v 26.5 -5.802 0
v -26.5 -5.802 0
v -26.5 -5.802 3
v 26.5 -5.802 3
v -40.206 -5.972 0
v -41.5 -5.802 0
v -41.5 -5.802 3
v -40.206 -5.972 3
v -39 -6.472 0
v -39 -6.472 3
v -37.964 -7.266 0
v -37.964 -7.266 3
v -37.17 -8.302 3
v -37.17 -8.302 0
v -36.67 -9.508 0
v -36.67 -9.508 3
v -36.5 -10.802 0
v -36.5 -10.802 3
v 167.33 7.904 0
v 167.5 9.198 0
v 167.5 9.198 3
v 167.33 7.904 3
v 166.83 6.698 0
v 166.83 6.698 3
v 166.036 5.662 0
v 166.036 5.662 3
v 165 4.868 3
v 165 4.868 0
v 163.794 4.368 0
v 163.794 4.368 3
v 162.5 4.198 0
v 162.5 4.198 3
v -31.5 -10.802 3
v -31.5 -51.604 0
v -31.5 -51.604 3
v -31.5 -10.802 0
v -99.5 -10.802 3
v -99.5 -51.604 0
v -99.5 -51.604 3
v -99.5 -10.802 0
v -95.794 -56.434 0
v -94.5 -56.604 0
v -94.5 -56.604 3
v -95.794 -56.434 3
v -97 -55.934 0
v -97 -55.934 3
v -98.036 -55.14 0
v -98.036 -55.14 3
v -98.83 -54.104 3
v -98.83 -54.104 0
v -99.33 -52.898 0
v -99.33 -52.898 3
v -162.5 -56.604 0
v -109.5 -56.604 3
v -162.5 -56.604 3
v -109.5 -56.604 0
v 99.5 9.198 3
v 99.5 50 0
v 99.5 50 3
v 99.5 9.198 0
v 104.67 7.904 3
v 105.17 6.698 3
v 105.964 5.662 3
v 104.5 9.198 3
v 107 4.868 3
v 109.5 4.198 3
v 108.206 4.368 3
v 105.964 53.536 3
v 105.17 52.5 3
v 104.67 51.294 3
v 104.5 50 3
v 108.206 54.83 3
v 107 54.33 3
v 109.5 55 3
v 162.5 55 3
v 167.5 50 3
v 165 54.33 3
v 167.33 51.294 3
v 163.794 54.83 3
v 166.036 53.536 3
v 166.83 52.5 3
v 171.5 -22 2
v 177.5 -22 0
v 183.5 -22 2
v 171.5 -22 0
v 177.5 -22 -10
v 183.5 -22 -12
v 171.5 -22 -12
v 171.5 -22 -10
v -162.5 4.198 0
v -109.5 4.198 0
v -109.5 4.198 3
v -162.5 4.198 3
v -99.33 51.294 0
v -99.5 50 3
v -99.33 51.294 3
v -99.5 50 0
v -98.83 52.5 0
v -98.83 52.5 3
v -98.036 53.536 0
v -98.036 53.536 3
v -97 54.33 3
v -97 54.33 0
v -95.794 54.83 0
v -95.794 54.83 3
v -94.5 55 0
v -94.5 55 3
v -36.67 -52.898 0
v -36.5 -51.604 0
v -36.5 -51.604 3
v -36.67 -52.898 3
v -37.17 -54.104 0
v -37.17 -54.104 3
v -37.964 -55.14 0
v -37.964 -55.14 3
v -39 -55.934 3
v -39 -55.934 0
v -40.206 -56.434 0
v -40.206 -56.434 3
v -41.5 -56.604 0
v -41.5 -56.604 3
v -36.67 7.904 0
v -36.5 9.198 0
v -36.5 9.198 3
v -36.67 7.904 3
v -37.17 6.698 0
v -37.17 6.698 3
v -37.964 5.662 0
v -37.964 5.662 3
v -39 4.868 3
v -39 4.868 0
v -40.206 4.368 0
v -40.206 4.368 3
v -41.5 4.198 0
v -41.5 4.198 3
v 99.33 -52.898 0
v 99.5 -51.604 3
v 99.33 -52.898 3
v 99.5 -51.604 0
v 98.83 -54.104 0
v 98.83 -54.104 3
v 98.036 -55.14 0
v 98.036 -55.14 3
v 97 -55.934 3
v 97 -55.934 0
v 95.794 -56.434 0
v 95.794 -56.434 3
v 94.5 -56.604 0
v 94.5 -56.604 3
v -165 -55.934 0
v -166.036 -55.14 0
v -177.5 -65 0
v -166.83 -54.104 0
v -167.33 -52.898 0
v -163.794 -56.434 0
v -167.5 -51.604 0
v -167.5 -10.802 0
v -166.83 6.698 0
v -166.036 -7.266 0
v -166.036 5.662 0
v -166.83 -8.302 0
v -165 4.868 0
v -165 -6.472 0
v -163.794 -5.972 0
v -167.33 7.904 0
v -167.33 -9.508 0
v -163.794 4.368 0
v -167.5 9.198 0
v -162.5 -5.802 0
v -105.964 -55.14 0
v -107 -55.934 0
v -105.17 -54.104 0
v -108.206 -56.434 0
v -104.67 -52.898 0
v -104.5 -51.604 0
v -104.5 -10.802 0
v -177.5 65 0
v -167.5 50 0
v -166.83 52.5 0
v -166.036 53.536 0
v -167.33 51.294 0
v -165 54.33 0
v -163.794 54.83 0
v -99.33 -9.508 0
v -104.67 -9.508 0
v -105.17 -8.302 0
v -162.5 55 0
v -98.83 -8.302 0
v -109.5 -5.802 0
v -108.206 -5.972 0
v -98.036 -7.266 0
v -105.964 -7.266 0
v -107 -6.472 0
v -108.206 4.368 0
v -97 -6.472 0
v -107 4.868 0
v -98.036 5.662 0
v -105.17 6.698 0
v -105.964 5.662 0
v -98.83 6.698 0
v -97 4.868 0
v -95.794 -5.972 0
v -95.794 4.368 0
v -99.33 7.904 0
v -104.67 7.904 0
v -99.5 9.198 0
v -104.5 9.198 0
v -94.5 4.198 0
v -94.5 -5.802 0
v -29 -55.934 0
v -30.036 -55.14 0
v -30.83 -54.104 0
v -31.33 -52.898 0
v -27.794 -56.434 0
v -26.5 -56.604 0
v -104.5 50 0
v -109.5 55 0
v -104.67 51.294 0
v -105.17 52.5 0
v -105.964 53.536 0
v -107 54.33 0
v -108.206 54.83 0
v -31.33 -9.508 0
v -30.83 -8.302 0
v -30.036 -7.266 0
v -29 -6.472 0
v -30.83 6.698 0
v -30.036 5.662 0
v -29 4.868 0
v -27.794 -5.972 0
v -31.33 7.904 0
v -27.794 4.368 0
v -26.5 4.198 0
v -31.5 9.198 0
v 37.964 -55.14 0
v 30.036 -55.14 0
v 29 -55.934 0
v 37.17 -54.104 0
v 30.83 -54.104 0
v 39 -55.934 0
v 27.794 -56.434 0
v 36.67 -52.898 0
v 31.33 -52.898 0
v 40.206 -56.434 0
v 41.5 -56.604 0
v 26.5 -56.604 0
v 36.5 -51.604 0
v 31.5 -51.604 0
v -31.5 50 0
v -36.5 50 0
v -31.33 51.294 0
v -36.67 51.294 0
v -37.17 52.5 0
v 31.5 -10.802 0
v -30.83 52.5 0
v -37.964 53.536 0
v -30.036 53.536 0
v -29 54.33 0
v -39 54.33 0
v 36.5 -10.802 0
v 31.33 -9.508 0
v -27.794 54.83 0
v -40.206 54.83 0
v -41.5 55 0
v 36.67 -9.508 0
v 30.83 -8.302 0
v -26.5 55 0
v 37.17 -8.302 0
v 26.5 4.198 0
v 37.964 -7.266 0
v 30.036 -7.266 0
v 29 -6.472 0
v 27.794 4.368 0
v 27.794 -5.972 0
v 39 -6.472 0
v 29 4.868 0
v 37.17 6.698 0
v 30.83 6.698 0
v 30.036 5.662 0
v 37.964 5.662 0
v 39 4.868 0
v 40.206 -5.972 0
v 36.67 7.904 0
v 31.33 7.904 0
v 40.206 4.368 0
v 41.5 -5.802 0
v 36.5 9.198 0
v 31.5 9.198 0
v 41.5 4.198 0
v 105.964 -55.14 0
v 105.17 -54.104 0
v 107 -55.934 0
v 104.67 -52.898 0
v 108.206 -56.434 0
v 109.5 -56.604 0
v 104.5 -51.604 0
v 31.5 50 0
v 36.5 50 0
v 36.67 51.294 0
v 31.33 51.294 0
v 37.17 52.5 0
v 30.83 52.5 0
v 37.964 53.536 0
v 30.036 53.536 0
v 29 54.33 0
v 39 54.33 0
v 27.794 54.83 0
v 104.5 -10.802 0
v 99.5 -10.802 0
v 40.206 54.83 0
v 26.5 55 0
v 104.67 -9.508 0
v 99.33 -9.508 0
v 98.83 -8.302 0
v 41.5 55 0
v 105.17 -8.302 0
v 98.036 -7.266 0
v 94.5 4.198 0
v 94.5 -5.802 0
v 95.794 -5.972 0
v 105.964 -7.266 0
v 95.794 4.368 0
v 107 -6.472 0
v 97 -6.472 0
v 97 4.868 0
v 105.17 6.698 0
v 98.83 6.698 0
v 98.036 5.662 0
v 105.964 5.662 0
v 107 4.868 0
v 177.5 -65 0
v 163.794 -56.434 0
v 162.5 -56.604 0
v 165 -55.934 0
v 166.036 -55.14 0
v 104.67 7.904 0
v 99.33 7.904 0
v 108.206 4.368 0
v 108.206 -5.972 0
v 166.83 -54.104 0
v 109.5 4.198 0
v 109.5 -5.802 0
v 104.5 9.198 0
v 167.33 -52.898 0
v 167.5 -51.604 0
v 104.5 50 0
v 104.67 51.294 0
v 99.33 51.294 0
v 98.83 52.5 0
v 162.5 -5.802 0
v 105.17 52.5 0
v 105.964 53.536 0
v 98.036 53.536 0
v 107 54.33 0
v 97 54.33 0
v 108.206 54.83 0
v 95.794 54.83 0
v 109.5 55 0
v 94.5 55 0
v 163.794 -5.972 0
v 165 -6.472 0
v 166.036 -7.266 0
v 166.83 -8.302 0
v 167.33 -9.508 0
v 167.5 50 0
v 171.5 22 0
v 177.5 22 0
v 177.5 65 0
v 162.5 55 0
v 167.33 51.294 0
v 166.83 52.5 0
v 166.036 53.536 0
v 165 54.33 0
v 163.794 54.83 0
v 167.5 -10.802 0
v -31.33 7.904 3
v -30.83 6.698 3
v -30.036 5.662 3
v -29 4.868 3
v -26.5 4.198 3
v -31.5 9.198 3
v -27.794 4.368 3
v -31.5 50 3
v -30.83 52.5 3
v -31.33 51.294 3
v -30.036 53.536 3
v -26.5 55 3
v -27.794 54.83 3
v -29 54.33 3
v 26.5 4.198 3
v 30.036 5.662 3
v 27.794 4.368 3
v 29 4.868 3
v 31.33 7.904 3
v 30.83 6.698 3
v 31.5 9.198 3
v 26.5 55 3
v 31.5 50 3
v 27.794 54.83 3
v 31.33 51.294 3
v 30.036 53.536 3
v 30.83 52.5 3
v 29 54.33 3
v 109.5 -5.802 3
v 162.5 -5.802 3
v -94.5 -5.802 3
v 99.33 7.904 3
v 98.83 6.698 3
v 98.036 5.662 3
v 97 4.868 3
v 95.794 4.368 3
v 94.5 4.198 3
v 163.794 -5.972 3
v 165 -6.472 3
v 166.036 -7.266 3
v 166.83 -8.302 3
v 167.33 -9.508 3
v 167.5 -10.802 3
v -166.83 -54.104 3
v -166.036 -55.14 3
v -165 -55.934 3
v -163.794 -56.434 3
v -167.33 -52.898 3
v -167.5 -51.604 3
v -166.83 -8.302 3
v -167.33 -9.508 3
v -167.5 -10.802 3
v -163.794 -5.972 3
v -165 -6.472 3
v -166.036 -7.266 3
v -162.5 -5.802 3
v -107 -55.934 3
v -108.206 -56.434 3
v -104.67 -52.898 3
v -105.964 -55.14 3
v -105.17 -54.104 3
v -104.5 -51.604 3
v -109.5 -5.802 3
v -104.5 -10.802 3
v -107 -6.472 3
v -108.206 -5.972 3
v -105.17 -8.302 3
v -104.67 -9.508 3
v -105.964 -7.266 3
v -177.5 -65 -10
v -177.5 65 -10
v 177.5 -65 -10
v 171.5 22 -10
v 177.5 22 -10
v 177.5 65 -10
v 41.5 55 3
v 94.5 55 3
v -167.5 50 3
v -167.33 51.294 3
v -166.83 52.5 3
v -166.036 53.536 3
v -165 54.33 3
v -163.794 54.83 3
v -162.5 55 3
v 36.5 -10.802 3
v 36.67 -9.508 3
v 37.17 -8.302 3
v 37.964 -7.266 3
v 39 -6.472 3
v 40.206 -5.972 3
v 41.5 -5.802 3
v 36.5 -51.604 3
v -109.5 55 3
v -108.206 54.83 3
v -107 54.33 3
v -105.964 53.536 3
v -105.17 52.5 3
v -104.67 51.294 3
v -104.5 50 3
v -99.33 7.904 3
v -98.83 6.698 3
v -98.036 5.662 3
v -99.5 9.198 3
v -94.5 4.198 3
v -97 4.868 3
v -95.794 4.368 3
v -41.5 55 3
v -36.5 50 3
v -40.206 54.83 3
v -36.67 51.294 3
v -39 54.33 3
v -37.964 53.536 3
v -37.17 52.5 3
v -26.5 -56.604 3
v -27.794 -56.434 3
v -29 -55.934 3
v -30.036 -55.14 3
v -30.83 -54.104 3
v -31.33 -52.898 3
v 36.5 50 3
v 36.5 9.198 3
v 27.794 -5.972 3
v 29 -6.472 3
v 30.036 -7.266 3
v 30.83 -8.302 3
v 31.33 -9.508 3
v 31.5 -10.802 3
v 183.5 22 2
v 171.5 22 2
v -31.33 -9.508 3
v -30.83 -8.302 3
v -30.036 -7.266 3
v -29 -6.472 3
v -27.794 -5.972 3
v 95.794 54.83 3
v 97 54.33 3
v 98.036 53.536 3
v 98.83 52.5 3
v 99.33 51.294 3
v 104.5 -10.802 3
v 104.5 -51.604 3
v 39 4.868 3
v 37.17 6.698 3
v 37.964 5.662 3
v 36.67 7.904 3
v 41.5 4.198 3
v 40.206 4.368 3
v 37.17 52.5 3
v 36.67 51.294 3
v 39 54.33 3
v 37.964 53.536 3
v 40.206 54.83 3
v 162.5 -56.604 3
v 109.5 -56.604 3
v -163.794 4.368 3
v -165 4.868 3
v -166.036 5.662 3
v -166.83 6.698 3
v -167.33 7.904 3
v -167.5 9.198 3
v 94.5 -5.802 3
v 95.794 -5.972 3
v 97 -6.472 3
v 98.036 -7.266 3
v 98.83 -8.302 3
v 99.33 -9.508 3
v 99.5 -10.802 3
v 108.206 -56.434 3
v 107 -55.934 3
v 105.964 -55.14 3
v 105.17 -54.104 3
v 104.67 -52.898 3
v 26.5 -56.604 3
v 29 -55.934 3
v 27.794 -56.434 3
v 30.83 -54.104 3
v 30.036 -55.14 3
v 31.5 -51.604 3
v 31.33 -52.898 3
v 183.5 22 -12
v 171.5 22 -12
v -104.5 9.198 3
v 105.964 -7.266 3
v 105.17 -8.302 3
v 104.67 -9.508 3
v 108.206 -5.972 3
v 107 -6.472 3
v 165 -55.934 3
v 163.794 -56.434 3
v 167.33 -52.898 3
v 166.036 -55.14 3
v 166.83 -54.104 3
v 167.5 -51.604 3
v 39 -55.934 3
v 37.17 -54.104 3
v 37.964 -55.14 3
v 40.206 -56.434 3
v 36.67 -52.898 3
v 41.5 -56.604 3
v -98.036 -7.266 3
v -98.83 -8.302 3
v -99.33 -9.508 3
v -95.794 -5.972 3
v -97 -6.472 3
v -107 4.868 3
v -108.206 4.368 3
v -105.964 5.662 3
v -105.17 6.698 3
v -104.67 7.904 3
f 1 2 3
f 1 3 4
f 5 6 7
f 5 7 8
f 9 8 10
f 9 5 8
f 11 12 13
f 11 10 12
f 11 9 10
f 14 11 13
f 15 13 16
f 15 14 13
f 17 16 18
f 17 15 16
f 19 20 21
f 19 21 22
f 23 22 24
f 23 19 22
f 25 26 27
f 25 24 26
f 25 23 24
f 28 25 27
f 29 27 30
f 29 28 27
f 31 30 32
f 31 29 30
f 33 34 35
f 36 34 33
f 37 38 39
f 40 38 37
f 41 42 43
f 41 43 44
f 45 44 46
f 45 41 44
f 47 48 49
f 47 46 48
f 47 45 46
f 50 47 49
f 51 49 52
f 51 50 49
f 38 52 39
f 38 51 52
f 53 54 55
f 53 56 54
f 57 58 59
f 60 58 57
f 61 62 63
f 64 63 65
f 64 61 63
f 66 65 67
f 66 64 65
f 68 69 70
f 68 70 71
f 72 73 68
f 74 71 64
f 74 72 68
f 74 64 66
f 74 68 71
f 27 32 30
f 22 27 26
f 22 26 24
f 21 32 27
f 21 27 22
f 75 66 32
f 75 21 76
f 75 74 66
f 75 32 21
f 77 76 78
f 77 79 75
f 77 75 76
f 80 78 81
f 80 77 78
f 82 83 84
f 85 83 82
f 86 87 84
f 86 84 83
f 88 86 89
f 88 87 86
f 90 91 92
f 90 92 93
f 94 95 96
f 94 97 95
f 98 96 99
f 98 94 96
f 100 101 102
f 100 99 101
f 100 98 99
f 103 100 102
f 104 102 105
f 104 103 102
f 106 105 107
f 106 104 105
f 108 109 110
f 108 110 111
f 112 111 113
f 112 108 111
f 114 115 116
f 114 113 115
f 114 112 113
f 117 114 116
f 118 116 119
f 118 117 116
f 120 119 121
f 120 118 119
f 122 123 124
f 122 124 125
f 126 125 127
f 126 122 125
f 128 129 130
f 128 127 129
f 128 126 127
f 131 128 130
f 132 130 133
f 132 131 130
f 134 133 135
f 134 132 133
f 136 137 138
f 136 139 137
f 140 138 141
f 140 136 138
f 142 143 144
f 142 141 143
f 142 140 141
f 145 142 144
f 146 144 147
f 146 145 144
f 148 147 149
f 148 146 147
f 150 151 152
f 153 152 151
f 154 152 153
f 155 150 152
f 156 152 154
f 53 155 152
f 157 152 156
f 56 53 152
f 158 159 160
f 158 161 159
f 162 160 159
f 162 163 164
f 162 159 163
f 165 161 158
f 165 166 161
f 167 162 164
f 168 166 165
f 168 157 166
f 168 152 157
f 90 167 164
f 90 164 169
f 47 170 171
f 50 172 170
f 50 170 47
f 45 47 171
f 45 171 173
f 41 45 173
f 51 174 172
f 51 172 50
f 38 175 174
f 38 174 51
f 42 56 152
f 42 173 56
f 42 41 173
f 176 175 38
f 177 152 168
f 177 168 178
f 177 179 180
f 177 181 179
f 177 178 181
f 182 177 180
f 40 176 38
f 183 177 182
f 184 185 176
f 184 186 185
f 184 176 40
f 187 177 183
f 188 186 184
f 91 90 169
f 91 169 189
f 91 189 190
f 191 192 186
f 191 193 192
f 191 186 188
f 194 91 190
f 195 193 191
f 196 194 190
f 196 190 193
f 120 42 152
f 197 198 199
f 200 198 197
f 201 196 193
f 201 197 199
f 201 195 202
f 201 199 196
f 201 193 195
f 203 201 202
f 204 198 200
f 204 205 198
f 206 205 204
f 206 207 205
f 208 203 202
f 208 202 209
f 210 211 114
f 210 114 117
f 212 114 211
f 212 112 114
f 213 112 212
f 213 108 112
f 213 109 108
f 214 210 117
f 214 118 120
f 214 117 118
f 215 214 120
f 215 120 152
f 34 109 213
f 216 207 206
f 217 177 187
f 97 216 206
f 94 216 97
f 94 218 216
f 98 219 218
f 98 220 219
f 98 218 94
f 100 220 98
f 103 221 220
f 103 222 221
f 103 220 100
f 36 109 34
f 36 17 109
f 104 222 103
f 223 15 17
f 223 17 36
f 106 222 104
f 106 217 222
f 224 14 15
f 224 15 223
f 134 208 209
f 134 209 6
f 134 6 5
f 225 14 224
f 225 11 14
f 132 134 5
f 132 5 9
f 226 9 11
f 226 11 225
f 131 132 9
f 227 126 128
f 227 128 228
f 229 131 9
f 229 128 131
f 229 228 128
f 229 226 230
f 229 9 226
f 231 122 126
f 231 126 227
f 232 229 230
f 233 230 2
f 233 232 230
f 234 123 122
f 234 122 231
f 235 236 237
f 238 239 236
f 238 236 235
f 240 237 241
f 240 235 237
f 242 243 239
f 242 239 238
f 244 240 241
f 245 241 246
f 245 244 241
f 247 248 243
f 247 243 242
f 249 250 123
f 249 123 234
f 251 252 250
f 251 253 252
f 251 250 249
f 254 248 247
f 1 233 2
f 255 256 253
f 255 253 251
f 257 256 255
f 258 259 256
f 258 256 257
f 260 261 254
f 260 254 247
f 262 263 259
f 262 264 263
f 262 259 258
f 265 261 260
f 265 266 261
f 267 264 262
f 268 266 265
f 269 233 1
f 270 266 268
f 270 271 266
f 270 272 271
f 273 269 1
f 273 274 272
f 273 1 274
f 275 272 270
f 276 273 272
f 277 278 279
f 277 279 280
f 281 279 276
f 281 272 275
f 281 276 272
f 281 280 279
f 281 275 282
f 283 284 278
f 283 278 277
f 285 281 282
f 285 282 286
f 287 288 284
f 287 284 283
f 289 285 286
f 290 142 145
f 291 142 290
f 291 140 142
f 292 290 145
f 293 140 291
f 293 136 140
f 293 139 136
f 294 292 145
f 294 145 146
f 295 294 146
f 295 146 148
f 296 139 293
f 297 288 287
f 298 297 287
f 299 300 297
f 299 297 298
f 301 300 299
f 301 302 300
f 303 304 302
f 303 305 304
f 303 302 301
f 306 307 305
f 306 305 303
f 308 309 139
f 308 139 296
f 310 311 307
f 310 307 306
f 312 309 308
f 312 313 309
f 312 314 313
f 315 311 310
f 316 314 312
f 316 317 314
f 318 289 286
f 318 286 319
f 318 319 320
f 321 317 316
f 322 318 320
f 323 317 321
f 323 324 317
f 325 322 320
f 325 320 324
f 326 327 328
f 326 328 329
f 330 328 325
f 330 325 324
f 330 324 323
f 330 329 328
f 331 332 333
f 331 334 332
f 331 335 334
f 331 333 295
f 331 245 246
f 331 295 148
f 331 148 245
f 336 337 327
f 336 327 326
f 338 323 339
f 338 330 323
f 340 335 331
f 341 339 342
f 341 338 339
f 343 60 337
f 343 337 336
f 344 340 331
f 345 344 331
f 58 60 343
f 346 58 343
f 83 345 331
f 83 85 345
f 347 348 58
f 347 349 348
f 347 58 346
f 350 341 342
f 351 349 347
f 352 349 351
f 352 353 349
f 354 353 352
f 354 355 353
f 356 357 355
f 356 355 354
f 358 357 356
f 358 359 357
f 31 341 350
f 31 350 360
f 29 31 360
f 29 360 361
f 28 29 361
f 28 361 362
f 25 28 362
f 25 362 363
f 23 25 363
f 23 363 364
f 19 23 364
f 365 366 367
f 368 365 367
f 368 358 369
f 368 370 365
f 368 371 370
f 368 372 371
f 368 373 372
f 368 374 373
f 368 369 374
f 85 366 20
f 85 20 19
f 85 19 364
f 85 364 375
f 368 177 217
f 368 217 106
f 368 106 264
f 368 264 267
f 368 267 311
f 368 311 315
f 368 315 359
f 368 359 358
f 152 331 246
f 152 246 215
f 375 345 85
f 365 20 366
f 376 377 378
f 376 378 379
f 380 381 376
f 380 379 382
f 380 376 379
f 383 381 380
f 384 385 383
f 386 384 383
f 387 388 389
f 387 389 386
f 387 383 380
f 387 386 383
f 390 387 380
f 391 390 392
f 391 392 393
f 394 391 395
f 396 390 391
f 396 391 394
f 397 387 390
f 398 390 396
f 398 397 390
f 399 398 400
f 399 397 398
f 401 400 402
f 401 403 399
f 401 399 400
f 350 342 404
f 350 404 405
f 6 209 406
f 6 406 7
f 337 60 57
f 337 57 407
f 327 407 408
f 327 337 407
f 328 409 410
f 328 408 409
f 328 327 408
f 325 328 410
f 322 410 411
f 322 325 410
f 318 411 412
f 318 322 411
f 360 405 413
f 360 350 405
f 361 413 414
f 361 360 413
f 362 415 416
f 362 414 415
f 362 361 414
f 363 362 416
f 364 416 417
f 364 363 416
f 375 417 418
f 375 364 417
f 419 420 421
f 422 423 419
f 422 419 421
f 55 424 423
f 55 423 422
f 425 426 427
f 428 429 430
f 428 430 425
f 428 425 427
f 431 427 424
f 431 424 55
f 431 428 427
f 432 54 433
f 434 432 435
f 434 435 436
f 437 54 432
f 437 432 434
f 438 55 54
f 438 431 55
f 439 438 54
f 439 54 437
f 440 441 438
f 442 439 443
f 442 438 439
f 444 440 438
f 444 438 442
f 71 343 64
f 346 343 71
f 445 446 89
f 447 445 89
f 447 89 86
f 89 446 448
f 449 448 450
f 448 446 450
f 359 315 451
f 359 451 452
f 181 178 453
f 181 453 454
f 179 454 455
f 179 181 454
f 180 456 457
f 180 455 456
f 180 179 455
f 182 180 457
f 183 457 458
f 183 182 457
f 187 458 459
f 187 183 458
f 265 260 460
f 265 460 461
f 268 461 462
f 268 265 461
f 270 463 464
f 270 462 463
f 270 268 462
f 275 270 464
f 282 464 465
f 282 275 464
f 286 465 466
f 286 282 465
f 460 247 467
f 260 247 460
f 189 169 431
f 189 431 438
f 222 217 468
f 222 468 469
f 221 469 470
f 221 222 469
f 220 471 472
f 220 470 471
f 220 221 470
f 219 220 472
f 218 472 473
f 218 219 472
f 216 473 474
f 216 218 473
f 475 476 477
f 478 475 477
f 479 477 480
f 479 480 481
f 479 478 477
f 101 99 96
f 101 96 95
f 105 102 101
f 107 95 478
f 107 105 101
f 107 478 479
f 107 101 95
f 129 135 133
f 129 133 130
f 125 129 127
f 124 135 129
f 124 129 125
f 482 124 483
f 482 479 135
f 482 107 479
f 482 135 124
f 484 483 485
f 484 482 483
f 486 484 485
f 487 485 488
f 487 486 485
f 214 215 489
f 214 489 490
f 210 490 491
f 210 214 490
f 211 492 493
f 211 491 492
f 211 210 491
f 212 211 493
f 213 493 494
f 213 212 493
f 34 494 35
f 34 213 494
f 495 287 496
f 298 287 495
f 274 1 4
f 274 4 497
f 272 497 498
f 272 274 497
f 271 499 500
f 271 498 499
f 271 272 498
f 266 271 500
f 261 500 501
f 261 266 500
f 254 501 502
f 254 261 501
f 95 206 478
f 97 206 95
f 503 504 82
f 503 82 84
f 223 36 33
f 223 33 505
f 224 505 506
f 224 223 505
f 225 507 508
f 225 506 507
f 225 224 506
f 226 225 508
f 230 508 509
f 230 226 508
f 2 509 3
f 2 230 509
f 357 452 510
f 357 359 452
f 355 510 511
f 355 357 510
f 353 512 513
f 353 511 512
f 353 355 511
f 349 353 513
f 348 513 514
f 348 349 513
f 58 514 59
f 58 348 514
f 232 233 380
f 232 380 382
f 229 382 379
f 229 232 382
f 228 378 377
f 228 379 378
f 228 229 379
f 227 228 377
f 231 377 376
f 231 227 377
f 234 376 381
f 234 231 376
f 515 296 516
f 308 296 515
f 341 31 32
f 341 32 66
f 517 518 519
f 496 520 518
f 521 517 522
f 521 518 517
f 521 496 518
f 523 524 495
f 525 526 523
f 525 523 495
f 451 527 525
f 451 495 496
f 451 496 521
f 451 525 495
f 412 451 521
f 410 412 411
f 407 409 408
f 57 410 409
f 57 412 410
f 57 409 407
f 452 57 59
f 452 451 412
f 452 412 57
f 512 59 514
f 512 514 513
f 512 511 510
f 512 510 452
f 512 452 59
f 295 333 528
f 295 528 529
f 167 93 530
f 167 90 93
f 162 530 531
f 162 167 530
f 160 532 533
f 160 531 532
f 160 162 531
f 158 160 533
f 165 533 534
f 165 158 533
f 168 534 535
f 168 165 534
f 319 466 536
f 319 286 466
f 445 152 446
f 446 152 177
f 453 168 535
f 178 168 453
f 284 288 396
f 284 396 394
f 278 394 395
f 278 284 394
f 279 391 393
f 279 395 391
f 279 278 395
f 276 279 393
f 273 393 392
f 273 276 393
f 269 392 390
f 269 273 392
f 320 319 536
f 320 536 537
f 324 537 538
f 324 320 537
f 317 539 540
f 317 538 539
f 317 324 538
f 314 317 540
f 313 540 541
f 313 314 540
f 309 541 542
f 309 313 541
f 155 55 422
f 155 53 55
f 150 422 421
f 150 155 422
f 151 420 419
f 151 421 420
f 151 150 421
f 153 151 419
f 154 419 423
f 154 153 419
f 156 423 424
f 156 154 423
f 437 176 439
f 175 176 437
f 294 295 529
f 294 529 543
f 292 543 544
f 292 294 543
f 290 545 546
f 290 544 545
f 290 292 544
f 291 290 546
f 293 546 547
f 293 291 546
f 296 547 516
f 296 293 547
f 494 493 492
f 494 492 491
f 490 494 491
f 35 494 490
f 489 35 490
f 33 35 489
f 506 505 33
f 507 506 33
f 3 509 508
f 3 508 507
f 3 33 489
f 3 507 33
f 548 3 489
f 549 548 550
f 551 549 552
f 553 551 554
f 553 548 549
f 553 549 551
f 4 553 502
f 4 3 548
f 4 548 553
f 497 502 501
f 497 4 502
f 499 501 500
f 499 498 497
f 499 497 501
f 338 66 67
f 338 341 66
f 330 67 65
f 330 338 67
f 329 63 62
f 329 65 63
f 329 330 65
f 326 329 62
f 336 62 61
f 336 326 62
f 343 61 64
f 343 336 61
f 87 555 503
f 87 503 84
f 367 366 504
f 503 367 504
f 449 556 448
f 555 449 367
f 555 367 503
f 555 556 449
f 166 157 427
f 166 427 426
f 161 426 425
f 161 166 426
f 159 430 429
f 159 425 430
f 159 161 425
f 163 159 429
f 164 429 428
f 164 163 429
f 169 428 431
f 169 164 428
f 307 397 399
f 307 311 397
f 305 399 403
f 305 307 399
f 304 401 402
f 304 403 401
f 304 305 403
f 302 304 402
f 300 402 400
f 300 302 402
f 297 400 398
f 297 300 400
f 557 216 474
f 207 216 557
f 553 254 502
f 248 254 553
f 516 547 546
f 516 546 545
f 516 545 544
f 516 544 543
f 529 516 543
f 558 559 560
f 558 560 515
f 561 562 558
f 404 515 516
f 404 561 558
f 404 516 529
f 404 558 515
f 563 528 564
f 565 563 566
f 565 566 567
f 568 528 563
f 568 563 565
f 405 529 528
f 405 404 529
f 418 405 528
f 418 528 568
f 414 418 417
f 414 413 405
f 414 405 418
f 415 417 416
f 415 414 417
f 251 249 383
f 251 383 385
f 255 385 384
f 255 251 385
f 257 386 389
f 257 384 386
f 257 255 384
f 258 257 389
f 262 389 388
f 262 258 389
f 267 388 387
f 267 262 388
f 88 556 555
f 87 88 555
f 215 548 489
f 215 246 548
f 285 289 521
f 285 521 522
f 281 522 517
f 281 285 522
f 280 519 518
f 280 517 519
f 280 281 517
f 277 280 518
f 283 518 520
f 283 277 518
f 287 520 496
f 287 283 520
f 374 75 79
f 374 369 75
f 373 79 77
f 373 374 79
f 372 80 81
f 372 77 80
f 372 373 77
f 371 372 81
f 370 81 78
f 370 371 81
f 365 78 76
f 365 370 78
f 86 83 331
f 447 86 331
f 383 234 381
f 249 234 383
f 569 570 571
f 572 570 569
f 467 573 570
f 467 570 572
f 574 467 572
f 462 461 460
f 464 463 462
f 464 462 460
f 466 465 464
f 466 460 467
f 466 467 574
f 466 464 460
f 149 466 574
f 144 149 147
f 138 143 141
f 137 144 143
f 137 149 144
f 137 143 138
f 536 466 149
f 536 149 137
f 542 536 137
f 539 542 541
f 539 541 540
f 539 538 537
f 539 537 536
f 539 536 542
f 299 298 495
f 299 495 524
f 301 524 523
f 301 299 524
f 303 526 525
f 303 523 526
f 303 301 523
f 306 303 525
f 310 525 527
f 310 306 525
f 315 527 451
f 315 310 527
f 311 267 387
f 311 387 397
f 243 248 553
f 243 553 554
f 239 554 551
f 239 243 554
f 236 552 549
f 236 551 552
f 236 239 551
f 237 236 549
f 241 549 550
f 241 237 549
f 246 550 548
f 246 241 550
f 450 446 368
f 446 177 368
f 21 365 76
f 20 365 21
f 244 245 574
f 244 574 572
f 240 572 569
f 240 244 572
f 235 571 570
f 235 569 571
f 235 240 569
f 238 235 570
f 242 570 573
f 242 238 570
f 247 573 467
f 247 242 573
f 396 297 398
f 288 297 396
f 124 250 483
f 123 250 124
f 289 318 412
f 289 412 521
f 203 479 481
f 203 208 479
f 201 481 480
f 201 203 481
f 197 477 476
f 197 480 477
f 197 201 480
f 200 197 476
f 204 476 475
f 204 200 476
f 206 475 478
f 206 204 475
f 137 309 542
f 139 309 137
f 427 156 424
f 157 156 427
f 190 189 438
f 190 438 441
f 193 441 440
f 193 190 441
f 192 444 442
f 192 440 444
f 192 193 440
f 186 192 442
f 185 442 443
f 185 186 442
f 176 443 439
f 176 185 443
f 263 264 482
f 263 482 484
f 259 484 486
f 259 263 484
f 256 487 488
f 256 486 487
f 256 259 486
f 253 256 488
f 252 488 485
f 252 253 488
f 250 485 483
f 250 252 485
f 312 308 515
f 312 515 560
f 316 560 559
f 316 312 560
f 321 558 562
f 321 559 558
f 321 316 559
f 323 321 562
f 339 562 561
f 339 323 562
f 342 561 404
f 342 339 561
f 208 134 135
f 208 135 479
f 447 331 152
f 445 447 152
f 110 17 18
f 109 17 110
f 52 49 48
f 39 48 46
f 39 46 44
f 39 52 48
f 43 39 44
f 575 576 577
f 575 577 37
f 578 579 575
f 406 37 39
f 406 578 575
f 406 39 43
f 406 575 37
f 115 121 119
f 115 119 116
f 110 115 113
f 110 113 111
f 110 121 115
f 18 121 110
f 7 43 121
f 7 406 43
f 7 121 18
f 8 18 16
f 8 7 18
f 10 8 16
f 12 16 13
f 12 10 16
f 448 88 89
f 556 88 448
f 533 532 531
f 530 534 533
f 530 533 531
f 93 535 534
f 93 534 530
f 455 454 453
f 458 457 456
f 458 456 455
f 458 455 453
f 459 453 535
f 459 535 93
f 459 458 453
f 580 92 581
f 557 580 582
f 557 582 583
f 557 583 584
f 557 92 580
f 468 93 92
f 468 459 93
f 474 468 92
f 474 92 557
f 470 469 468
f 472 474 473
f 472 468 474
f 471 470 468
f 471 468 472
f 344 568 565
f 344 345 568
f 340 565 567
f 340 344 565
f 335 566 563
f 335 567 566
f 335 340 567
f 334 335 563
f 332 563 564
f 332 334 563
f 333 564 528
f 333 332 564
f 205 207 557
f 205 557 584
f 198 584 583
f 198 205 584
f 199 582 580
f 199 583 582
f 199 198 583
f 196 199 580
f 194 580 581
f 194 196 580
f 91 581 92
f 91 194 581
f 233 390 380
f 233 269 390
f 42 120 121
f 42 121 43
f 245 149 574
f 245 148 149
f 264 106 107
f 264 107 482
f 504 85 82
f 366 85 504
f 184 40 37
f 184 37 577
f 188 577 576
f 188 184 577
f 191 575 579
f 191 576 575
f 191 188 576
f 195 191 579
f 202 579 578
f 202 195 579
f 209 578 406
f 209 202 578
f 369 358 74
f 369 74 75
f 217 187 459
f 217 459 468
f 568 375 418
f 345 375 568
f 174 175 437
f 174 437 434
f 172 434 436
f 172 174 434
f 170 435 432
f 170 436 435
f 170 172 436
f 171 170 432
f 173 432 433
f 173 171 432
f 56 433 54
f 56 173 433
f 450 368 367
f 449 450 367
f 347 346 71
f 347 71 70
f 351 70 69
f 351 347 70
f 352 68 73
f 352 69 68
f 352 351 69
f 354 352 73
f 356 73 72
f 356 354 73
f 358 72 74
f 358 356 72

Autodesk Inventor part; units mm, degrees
ref_plane "YZ Plane" through (0, 0, 0) normal (1, 0, 0) x (0, 1, 0)
ref_plane "XZ Plane" through (0, 0, 0) normal (0, 1, 0) x (-1, 0, 0)
sketch "Sketch1" plane through (0, 0, 0) normal (0, 0, 1) x (1, 0, 0)
  line L0 (-177.5, 65) -> (177.5, 65)
  line L1 (177.5, 65) -> (177.5, -65)
  line L2 (177.5, -65) -> (-177.5, -65)
  line L3 (-177.5, -65) -> (-177.5, 65)
  line L4 (-177.5, 65) -> (177.5, -65) construction
  line L5 (177.5, 65) -> (-177.5, -65) construction
  point P0 (0, 0)
  dimension "d0" = 355
  dimension "d1" = 130
extrude "Extrusion1" add sketch "Sketch1" against normal blind 10
sketch "Sketch2" plane through (0, 0, 0) normal (0, 0, 1) x (1, 0, 0)
  line L0 (-162.5, 55) -> (-109.5, 55)
  line L1 (-104.5, 50) -> (-104.5, 9.1977)
  line L2 (-109.5, 4.1977) -> (-162.5, 4.1977)
  line L3 (-167.5, 9.1977) -> (-167.5, 50)
  line L4 (-177.5, 65) -> (177.5, 65) projected
  line L5 (-177.5, -65) -> (-177.5, 65) projected
  arc A0 (-162.5, 55) -> (-167.5, 50) centre (-162.5, 50) ccw
  arc A1 (-104.5, 50) -> (-109.5, 55) centre (-109.5, 50) ccw
  arc A2 (-109.5, 4.1977) -> (-104.5, 9.1977) centre (-109.5, 9.1977) ccw
  arc A3 (-167.5, 9.1977) -> (-162.5, 4.1977) centre (-162.5, 9.1977) ccw
  line L6 (-94.5, 55) -> (-41.5, 55)
  line L7 (-36.5, 50) -> (-36.5, 9.1977)
  line L8 (-41.5, 4.1977) -> (-94.5, 4.1977)
  line L9 (-99.5, 9.1977) -> (-99.5, 50)
  arc A4 (-94.5, 55) -> (-99.5, 50) centre (-94.5, 50) ccw
  arc A5 (-36.5, 50) -> (-41.5, 55) centre (-41.5, 50) ccw
  arc A6 (-41.5, 4.1977) -> (-36.5, 9.1977) centre (-41.5, 9.1977) ccw
  arc A7 (-99.5, 9.1977) -> (-94.5, 4.1977) centre (-94.5, 9.1977) ccw
  line L10 (-26.5, 55) -> (26.5, 55)
  line L11 (31.5, 50) -> (31.5, 9.1977)
  line L12 (26.5, 4.1977) -> (-26.5, 4.1977)
  line L13 (-31.5, 9.1977) -> (-31.5, 50)
  arc A8 (-26.5, 55) -> (-31.5, 50) centre (-26.5, 50) ccw
  arc A9 (31.5, 50) -> (26.5, 55) centre (26.5, 50) ccw
  arc A10 (26.5, 4.1977) -> (31.5, 9.1977) centre (26.5, 9.1977) ccw
  arc A11 (-31.5, 9.1977) -> (-26.5, 4.1977) centre (-26.5, 9.1977) ccw
  line L14 (41.5, 55) -> (94.5, 55)
  line L15 (99.5, 50) -> (99.5, 9.1977)
  line L16 (94.5, 4.1977) -> (41.5, 4.1977)
  line L17 (36.5, 9.1977) -> (36.5, 50)
  arc A12 (41.5, 55) -> (36.5, 50) centre (41.5, 50) ccw
  arc A13 (99.5, 50) -> (94.5, 55) centre (94.5, 50) ccw
  arc A14 (94.5, 4.1977) -> (99.5, 9.1977) centre (94.5, 9.1977) ccw
  arc A15 (36.5, 9.1977) -> (41.5, 4.1977) centre (41.5, 9.1977) ccw
  line L18 (109.5, 55) -> (162.5, 55)
  line L19 (167.5, 50) -> (167.5, 9.1977)
  line L20 (162.5, 4.1977) -> (109.5, 4.1977)
  line L21 (104.5, 9.1977) -> (104.5, 50)
  arc A16 (109.5, 55) -> (104.5, 50) centre (109.5, 50) ccw
  arc A17 (167.5, 50) -> (162.5, 55) centre (162.5, 50) ccw
  arc A18 (162.5, 4.1977) -> (167.5, 9.1977) centre (162.5, 9.1977) ccw
  arc A19 (104.5, 9.1977) -> (109.5, 4.1977) centre (109.5, 9.1977) ccw
  line L22 (-162.5, -5.802) -> (-109.5, -5.802)
  line L23 (-167.5, -51.6043) -> (-167.5, -10.802)
  line L24 (-109.5, -56.6043) -> (-162.5, -56.6043)
  line L25 (-104.5, -10.802) -> (-104.5, -51.6043)
  line L26 (-99.5, -51.6043) -> (-99.5, -10.802)
  line L27 (-94.5, -5.802) -> (-41.5, -5.802)
  line L28 (-36.5, -10.802) -> (-36.5, -51.6043)
  line L29 (-41.5, -56.6043) -> (-94.5, -56.6043)
  line L30 (-31.5, -51.6043) -> (-31.5, -10.802)
  line L31 (-26.5, -5.802) -> (26.5, -5.802)
  line L32 (31.5, -10.802) -> (31.5, -51.6043)
  line L33 (26.5, -56.6043) -> (-26.5, -56.6043)
  line L34 (41.5, -5.802) -> (94.5, -5.802)
  line L35 (36.5, -51.6043) -> (36.5, -10.802)
  line L36 (94.5, -56.6043) -> (41.5, -56.6043)
  line L37 (99.5, -10.802) -> (99.5, -51.6043)
  line L38 (104.5, -51.6043) -> (104.5, -10.802)
  line L39 (109.5, -5.802) -> (162.5, -5.802)
  line L40 (167.5, -10.802) -> (167.5, -51.6043)
  line L41 (162.5, -56.6043) -> (109.5, -56.6043)
  arc A20 (-162.5, -5.802) -> (-167.5, -10.802) centre (-162.5, -10.802) ccw
  arc A21 (-104.5, -10.802) -> (-109.5, -5.802) centre (-109.5, -10.802) ccw
  arc A22 (-167.5, -51.6043) -> (-162.5, -56.6043) centre (-162.5, -51.6043) ccw
  arc A23 (-109.5, -56.6043) -> (-104.5, -51.6043) centre (-109.5, -51.6043) ccw
  arc A24 (-99.5, -51.6043) -> (-94.5, -56.6043) centre (-94.5, -51.6043) ccw
  arc A25 (-94.5, -5.802) -> (-99.5, -10.802) centre (-94.5, -10.802) ccw
  arc A26 (-36.5, -10.802) -> (-41.5, -5.802) centre (-41.5, -10.802) ccw
  arc A27 (-26.5, -5.802) -> (-31.5, -10.802) centre (-26.5, -10.802) ccw
  arc A28 (-41.5, -56.6043) -> (-36.5, -51.6043) centre (-41.5, -51.6043) ccw
  arc A29 (-31.5, -51.6043) -> (-26.5, -56.6043) centre (-26.5, -51.6043) ccw
  arc A30 (31.5, -10.802) -> (26.5, -5.802) centre (26.5, -10.802) ccw
  arc A31 (26.5, -56.6043) -> (31.5, -51.6043) centre (26.5, -51.6043) ccw
  arc A32 (36.5, -51.6043) -> (41.5, -56.6043) centre (41.5, -51.6043) ccw
  arc A33 (41.5, -5.802) -> (36.5, -10.802) centre (41.5, -10.802) ccw
  arc A34 (99.5, -10.802) -> (94.5, -5.802) centre (94.5, -10.802) ccw
  arc A35 (94.5, -56.6043) -> (99.5, -51.6043) centre (94.5, -51.6043) ccw
  arc A36 (104.5, -51.6043) -> (109.5, -56.6043) centre (109.5, -51.6043) ccw
  arc A37 (109.5, -5.802) -> (104.5, -10.802) centre (109.5, -10.802) ccw
  arc A38 (167.5, -10.802) -> (162.5, -5.802) centre (162.5, -10.802) ccw
  arc A39 (162.5, -56.6043) -> (167.5, -51.6043) centre (162.5, -51.6043) ccw
  line L42 (171.5, 22) -> (183.5, 22)
  line L43 (183.5, 22) -> (183.5, -22)
  line L44 (183.5, -22) -> (171.5, -22)
  line L45 (171.5, -22) -> (171.5, 22)
  line L46 (177.5, 65) -> (177.5, -65) projected
  line L47 (171.5, 22) -> (183.5, -22) construction
  line L48 (183.5, 22) -> (171.5, -22) construction
  point P0 (0, 0)
  point P1 (-167.5, 55)
  point P2 (-104.5, 55)
  point P3 (-167.5, 4.1977)
  point P4 (-99.5, 55)
  point P5 (-36.5, 55)
  point P6 (-99.5, 4.1977)
  point P7 (-31.5, 55)
  point P8 (31.5, 55)
  point P9 (-31.5, 4.1977)
  point P10 (36.5, 55)
  point P11 (99.5, 55)
  point P12 (36.5, 4.1977)
  point P13 (104.5, 55)
  point P14 (167.5, 55)
  point P15 (104.5, 4.1977)
  point P16 (-167.5, -5.802)
  point P17 (-104.5, -5.802)
  point P18 (-167.5, -56.6043)
  point P19 (-99.5, -5.802)
  point P20 (-99.5, -56.6043)
  point P21 (-36.5, -5.802)
  point P22 (-31.5, -5.802)
  point P23 (-31.5, -56.6043)
  point P24 (31.5, -5.802)
  point P25 (36.5, -5.802)
  point P26 (99.5, -5.802)
  point P27 (36.5, -56.6043)
  point P28 (104.5, -5.802)
  point P29 (104.5, -56.6043)
  point P30 (167.5, -5.802)
  point P31 (177.5, 0)
  dimension "d4" = 10
  dimension "d5" = 10
  dimension "d7" = 50.8023
  dimension "d8" = 63
  dimension "d9" = 5
  dimension "d12" = 68
  dimension "d19" = 60.802
  dimension "d24" = 12
  dimension "d25" = 44
extrude "Extrusion2" add sketch "Sketch2" along normal blind 3 contours L0 A1 L1 A2 L2 A3 L3 A0 | L6 A5 L7 A6 L8 A7 L9 A4 | L10 A9 L11 A10 L12 A11 L13 A8 | L14 A13 L15 A14 L16 A15 L17 A12 | L18 A17 L19 A18 L20 A19 L21 A16 | L22 A21 L25 A23 L24 A22 L23 A20 | L26 A25 L27 A26 L28 A28 L29 A24 | L30 A27 L31 A30 L32 A31 L33 A29 | L34 A34 L37 A35 L36 A32 L35 A33 | L38 A37 L39 A38 L40 A39 L41 A36
ref_plane "Work Plane1" through (0, 0, -5) normal (0, 0, 1) x (1, 0, 0)
sketch "Sketch3" plane through (0, 0, -5) normal (0, 0, 1) x (1, 0, 0)
  line L0 (171.5, 22) -> (183.5, 22)
  line L1 (183.5, 22) -> (183.5, -22)
  line L2 (183.5, -22) -> (171.5, -22)
  line L3 (171.5, -22) -> (171.5, 22)
  line L4 (177.5, 65) -> (177.5, -65) projected
  line L5 (171.5, 22) -> (183.5, -22) construction
  line L6 (183.5, 22) -> (171.5, -22) construction
  point P0 (0, 0)
  point P1 (177.5, 0)
  dimension "d31" = 12
  dimension "d32" = 44
extrude "Extrusion3" add sketch "Sketch3" along normal mid plane 14
properties part number "Solar_panel"
